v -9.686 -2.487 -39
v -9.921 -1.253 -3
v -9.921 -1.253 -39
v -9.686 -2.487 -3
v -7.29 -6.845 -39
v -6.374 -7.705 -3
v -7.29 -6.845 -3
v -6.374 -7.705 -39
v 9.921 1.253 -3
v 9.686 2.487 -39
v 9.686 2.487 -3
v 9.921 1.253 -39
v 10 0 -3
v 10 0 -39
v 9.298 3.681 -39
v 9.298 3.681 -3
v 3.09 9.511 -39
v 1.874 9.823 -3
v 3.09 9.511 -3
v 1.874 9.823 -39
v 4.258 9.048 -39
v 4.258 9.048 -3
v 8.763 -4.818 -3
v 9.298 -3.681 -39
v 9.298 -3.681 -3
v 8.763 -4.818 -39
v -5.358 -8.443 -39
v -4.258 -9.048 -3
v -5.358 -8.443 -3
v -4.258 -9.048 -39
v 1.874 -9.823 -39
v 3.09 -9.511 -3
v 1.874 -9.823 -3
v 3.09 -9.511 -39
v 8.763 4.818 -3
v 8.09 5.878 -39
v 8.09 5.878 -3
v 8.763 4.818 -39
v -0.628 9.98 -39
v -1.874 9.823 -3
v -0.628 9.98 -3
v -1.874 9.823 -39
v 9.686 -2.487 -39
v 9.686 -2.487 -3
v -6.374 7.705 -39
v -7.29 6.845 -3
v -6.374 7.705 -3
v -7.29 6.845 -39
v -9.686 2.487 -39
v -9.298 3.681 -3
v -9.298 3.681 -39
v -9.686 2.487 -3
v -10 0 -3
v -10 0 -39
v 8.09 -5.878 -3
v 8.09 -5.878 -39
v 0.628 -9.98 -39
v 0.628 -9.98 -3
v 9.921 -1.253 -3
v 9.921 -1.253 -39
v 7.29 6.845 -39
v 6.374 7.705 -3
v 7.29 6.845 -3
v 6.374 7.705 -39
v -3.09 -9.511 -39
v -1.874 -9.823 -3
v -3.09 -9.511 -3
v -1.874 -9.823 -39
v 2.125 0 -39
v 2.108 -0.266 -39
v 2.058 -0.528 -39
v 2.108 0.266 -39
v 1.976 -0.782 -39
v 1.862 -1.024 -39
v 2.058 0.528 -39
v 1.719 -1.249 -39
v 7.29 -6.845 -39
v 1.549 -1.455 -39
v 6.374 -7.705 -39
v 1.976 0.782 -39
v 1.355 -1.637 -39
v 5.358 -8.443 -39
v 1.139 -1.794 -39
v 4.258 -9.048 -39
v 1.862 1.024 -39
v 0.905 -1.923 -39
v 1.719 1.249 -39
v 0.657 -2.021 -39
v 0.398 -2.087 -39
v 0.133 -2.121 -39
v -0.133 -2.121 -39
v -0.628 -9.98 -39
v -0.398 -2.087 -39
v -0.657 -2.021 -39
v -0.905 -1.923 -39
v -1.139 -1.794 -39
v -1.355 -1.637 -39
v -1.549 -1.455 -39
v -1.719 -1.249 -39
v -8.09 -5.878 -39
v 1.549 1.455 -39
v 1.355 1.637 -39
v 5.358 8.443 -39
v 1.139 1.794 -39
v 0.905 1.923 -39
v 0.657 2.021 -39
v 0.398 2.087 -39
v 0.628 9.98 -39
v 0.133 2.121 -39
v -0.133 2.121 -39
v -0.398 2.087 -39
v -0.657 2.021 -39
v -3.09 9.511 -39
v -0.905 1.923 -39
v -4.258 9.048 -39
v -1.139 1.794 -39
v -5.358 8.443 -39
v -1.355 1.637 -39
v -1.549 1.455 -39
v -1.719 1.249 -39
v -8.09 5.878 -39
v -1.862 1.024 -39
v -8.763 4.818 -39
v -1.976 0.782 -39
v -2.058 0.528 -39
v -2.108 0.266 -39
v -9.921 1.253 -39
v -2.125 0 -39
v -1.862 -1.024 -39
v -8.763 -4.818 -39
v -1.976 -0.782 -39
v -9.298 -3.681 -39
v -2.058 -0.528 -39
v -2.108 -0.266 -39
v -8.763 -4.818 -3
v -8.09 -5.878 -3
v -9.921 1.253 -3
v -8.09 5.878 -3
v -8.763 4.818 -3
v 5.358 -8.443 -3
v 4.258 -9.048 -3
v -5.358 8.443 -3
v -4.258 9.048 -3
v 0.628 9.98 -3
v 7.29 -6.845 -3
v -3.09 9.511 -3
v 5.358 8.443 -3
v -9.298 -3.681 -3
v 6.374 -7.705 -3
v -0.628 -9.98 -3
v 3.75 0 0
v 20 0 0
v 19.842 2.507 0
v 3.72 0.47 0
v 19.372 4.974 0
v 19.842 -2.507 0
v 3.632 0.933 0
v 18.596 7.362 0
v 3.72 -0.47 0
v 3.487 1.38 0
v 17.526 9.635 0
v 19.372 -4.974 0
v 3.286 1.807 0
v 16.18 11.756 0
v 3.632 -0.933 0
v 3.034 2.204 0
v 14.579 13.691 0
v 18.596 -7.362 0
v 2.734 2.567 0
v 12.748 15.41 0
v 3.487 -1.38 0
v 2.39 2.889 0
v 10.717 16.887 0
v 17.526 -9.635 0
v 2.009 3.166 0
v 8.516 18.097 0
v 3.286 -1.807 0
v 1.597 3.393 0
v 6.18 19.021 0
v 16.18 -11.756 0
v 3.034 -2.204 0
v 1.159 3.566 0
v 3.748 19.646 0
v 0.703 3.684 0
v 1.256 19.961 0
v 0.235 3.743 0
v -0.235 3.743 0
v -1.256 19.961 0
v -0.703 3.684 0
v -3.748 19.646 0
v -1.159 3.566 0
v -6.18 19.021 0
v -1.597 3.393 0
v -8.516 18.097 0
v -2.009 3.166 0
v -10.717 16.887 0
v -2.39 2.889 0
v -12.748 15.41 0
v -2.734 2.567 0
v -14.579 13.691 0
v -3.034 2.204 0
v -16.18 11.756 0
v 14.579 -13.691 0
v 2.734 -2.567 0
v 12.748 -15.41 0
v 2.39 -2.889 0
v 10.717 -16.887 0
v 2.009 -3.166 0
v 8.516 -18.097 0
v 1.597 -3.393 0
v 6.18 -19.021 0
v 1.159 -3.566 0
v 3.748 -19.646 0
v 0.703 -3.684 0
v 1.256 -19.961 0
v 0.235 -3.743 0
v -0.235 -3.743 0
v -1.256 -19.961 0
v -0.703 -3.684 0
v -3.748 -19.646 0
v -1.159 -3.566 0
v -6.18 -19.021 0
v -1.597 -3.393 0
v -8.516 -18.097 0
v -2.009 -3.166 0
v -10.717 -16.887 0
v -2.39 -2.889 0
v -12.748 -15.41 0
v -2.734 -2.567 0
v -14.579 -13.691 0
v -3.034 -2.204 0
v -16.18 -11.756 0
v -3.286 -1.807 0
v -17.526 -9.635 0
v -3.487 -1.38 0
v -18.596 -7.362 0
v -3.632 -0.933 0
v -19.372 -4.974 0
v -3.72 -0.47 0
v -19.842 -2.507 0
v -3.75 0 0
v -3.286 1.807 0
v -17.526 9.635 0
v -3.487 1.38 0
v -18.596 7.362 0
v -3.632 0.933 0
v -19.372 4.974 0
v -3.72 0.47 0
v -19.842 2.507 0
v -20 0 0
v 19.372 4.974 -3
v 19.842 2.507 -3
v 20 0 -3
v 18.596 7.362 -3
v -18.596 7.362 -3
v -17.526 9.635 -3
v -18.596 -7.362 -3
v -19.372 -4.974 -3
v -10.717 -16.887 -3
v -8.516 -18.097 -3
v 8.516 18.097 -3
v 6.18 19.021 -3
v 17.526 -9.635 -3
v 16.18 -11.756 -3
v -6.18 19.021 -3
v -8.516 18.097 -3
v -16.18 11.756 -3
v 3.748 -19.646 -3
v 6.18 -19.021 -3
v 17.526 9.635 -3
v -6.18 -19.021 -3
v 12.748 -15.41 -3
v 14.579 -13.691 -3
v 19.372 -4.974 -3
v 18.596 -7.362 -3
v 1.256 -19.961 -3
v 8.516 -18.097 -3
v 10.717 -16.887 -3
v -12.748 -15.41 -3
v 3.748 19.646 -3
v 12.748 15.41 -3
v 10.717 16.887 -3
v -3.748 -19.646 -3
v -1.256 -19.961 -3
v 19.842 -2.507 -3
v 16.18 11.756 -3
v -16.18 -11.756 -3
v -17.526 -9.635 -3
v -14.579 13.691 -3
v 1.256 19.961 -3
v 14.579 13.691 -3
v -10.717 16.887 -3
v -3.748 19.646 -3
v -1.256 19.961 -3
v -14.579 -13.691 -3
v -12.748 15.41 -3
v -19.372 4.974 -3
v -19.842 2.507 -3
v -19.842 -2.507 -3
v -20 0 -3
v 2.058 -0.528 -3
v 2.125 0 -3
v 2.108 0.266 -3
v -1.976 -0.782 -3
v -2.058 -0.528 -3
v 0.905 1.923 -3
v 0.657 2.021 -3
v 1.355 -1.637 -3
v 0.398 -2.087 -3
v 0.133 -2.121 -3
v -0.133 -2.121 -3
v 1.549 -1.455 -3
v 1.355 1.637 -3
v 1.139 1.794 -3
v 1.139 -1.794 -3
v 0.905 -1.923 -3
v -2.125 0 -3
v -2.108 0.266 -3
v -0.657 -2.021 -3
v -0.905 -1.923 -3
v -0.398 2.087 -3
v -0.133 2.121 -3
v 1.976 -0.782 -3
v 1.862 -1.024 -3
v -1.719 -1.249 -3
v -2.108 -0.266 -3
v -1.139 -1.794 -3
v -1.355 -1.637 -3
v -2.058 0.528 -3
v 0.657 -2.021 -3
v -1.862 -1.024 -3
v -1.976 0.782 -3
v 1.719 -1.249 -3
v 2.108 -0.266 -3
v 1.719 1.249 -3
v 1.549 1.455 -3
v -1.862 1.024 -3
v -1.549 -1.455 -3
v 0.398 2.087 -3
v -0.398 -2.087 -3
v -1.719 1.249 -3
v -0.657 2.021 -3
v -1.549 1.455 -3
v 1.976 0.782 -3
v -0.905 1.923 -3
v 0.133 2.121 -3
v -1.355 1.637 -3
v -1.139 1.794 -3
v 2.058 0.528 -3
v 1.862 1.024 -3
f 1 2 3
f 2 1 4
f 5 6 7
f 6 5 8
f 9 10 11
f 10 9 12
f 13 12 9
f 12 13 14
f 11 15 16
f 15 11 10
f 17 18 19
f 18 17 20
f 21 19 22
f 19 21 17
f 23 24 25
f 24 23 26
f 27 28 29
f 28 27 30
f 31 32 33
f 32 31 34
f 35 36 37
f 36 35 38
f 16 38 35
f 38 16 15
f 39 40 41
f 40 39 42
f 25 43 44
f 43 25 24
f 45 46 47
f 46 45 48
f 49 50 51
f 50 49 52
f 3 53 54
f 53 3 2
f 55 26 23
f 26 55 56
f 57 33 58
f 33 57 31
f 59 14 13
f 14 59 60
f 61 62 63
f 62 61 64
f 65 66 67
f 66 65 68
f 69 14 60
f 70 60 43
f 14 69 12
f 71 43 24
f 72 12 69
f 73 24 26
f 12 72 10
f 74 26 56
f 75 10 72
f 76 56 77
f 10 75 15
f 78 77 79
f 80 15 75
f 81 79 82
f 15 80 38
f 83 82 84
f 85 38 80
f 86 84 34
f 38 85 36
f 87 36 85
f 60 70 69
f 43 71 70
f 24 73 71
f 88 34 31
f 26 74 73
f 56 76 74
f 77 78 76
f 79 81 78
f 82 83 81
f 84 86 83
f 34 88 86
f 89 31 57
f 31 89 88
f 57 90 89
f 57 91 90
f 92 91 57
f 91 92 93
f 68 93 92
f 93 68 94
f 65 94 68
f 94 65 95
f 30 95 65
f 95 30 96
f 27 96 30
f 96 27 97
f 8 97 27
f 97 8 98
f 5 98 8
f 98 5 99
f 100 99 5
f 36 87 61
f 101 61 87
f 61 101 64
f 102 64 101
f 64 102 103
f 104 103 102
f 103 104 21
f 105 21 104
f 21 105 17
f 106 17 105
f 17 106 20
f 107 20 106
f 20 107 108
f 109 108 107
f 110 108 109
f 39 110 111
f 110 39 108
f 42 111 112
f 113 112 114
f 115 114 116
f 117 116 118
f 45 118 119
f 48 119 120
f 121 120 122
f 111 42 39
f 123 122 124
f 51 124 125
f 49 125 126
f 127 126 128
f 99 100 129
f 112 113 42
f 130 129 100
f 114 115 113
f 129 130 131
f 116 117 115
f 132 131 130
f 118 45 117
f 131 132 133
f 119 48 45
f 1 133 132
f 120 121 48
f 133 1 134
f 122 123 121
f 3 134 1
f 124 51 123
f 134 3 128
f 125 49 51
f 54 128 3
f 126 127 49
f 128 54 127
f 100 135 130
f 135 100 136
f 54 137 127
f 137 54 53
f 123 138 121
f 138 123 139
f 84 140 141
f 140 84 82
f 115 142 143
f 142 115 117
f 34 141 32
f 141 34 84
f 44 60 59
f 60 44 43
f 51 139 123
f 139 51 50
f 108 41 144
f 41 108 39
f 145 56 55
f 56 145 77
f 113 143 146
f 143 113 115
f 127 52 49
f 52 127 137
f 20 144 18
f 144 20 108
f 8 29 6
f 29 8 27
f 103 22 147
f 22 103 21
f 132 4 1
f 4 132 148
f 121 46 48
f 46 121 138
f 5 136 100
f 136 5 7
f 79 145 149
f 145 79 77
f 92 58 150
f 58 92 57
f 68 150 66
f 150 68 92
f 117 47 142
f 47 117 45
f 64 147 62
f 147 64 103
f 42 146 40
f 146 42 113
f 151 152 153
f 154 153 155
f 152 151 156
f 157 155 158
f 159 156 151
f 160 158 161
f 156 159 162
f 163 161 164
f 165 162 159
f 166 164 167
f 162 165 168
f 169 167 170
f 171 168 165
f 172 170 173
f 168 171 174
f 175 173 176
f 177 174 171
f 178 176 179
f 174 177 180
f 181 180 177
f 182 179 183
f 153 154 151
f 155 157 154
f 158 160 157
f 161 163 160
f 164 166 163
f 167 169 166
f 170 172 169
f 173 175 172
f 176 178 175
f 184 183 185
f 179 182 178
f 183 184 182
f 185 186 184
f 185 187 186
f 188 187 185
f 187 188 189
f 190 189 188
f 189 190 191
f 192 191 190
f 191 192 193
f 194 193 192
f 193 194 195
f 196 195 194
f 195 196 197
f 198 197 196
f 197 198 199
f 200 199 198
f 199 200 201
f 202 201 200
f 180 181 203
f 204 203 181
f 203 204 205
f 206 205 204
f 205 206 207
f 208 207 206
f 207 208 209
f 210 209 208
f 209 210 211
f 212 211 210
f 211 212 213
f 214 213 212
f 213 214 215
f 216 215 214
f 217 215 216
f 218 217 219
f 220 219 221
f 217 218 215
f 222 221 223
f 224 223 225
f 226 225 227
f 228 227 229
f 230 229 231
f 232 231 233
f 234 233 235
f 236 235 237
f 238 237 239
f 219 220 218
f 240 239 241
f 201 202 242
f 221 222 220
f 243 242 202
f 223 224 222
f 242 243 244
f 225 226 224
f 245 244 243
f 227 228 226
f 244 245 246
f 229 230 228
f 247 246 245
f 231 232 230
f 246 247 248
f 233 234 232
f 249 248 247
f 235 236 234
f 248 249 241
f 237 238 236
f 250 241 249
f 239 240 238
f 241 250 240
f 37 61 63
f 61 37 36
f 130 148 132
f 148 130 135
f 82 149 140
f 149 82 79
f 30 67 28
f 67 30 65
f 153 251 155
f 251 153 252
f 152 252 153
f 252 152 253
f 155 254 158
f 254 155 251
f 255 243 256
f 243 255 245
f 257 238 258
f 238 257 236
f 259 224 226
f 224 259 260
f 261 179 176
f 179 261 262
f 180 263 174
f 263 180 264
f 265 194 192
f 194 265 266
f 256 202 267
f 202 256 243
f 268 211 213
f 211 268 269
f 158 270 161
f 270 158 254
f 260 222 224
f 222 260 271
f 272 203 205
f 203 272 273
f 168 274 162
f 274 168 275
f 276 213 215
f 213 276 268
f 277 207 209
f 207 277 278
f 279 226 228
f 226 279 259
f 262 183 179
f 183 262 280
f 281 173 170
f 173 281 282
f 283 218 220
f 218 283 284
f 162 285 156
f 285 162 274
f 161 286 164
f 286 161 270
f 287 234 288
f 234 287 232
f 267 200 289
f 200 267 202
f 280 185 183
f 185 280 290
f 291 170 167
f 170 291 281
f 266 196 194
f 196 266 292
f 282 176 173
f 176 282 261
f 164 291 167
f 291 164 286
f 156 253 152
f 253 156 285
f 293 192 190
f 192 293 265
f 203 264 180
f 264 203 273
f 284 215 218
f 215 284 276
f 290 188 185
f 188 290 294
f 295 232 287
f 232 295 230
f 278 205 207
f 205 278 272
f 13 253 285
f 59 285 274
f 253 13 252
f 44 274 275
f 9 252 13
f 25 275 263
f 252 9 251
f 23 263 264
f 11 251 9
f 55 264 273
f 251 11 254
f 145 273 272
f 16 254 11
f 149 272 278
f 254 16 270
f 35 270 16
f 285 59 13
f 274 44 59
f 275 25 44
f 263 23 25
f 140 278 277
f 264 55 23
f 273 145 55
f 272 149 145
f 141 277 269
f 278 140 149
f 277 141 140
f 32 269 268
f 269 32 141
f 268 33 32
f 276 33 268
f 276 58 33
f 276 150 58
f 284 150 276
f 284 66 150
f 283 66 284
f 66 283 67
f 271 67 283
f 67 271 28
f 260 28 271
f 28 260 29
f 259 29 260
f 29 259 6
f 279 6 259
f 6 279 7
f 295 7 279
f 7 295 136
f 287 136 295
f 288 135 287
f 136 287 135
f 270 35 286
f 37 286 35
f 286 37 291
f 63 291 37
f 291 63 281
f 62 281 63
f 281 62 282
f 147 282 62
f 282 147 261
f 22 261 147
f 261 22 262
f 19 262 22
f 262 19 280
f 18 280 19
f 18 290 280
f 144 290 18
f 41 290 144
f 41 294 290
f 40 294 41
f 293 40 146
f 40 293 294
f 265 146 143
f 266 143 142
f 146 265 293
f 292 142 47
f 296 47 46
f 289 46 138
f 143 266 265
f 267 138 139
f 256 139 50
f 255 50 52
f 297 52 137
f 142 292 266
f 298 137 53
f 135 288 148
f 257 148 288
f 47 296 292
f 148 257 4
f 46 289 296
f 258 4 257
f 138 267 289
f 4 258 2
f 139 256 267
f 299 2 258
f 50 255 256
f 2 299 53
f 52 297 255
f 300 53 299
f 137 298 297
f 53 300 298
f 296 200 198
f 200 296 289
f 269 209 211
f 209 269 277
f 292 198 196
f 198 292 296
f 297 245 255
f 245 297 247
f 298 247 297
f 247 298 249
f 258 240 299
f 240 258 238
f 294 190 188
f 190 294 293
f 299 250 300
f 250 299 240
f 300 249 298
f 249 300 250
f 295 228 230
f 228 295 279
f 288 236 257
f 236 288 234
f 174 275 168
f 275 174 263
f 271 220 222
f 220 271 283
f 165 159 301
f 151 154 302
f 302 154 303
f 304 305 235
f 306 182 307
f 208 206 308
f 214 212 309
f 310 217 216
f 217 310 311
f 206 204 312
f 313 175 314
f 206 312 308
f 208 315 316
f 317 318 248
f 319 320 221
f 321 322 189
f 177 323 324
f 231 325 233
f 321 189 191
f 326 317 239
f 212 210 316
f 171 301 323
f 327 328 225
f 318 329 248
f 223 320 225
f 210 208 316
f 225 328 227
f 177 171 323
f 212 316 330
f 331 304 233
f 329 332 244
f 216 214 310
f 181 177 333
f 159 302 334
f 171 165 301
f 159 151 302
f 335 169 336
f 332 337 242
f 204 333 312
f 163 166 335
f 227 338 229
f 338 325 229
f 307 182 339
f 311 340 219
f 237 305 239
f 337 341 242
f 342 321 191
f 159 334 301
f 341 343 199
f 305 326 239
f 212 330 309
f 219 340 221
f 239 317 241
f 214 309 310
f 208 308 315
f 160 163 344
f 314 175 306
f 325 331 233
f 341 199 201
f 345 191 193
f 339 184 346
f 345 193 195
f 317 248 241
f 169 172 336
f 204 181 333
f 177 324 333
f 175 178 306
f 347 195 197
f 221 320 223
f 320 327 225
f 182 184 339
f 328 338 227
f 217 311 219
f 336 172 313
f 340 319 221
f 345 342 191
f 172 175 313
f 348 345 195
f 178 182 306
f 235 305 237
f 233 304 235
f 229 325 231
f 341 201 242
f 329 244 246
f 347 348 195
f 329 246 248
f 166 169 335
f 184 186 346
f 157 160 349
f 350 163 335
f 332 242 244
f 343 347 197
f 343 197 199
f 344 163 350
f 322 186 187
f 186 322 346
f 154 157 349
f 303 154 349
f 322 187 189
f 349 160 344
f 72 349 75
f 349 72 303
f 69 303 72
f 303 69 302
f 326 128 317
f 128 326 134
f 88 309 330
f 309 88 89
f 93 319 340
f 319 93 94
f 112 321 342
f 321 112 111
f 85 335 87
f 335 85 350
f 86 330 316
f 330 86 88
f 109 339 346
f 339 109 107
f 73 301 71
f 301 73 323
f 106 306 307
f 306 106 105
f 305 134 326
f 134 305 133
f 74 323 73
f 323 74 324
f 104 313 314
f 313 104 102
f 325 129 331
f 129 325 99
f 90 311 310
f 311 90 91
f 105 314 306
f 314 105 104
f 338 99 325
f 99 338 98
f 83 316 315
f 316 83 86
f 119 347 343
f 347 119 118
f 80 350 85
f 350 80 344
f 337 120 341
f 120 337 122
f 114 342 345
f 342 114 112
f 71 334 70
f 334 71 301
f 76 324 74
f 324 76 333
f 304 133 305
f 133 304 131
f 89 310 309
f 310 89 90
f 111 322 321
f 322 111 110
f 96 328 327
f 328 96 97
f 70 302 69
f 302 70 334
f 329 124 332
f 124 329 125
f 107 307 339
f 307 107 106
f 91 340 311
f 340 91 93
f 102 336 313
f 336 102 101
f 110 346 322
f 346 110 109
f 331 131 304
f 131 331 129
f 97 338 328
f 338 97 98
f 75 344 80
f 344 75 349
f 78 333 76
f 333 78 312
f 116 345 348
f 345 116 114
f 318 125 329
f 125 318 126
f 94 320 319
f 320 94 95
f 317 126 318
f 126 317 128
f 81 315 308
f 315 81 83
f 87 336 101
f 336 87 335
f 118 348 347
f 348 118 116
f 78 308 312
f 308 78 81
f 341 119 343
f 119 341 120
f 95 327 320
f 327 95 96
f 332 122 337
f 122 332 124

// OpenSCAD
$fn = 50;


difference() {
	union() {
		translate(v = [0, 0, -39.0000000000]) {
			cylinder(h = 39, r = 10.0000000000);
		}
		translate(v = [0, 0, -3.0000000000]) {
			cylinder(h = 3, r = 20.0000000000);
		}
	}
	union() {
		translate(v = [0, 0, 0]) {
			rotate(a = [0, 0, 0]) {
				difference() {
					union() {
						#translate(v = [0, 0, -39.0000000000]) {
							cylinder(h = 39, r = 2.0000000000);
						}
						#translate(v = [0, 0, -3]) {
							cylinder(h = 3, r1 = 2.1250000000, r2 = 3.7500000000);
						}
						#translate(v = [0, 0, -39.0000000000]) {
							cylinder(h = 39, r = 2.1250000000);
						}
						#translate(v = [0, 0, -39.0000000000]) {
							cylinder(h = 39, r = 2.0000000000);
						}
					}
					union();
				}
			}
		}
	}
}
